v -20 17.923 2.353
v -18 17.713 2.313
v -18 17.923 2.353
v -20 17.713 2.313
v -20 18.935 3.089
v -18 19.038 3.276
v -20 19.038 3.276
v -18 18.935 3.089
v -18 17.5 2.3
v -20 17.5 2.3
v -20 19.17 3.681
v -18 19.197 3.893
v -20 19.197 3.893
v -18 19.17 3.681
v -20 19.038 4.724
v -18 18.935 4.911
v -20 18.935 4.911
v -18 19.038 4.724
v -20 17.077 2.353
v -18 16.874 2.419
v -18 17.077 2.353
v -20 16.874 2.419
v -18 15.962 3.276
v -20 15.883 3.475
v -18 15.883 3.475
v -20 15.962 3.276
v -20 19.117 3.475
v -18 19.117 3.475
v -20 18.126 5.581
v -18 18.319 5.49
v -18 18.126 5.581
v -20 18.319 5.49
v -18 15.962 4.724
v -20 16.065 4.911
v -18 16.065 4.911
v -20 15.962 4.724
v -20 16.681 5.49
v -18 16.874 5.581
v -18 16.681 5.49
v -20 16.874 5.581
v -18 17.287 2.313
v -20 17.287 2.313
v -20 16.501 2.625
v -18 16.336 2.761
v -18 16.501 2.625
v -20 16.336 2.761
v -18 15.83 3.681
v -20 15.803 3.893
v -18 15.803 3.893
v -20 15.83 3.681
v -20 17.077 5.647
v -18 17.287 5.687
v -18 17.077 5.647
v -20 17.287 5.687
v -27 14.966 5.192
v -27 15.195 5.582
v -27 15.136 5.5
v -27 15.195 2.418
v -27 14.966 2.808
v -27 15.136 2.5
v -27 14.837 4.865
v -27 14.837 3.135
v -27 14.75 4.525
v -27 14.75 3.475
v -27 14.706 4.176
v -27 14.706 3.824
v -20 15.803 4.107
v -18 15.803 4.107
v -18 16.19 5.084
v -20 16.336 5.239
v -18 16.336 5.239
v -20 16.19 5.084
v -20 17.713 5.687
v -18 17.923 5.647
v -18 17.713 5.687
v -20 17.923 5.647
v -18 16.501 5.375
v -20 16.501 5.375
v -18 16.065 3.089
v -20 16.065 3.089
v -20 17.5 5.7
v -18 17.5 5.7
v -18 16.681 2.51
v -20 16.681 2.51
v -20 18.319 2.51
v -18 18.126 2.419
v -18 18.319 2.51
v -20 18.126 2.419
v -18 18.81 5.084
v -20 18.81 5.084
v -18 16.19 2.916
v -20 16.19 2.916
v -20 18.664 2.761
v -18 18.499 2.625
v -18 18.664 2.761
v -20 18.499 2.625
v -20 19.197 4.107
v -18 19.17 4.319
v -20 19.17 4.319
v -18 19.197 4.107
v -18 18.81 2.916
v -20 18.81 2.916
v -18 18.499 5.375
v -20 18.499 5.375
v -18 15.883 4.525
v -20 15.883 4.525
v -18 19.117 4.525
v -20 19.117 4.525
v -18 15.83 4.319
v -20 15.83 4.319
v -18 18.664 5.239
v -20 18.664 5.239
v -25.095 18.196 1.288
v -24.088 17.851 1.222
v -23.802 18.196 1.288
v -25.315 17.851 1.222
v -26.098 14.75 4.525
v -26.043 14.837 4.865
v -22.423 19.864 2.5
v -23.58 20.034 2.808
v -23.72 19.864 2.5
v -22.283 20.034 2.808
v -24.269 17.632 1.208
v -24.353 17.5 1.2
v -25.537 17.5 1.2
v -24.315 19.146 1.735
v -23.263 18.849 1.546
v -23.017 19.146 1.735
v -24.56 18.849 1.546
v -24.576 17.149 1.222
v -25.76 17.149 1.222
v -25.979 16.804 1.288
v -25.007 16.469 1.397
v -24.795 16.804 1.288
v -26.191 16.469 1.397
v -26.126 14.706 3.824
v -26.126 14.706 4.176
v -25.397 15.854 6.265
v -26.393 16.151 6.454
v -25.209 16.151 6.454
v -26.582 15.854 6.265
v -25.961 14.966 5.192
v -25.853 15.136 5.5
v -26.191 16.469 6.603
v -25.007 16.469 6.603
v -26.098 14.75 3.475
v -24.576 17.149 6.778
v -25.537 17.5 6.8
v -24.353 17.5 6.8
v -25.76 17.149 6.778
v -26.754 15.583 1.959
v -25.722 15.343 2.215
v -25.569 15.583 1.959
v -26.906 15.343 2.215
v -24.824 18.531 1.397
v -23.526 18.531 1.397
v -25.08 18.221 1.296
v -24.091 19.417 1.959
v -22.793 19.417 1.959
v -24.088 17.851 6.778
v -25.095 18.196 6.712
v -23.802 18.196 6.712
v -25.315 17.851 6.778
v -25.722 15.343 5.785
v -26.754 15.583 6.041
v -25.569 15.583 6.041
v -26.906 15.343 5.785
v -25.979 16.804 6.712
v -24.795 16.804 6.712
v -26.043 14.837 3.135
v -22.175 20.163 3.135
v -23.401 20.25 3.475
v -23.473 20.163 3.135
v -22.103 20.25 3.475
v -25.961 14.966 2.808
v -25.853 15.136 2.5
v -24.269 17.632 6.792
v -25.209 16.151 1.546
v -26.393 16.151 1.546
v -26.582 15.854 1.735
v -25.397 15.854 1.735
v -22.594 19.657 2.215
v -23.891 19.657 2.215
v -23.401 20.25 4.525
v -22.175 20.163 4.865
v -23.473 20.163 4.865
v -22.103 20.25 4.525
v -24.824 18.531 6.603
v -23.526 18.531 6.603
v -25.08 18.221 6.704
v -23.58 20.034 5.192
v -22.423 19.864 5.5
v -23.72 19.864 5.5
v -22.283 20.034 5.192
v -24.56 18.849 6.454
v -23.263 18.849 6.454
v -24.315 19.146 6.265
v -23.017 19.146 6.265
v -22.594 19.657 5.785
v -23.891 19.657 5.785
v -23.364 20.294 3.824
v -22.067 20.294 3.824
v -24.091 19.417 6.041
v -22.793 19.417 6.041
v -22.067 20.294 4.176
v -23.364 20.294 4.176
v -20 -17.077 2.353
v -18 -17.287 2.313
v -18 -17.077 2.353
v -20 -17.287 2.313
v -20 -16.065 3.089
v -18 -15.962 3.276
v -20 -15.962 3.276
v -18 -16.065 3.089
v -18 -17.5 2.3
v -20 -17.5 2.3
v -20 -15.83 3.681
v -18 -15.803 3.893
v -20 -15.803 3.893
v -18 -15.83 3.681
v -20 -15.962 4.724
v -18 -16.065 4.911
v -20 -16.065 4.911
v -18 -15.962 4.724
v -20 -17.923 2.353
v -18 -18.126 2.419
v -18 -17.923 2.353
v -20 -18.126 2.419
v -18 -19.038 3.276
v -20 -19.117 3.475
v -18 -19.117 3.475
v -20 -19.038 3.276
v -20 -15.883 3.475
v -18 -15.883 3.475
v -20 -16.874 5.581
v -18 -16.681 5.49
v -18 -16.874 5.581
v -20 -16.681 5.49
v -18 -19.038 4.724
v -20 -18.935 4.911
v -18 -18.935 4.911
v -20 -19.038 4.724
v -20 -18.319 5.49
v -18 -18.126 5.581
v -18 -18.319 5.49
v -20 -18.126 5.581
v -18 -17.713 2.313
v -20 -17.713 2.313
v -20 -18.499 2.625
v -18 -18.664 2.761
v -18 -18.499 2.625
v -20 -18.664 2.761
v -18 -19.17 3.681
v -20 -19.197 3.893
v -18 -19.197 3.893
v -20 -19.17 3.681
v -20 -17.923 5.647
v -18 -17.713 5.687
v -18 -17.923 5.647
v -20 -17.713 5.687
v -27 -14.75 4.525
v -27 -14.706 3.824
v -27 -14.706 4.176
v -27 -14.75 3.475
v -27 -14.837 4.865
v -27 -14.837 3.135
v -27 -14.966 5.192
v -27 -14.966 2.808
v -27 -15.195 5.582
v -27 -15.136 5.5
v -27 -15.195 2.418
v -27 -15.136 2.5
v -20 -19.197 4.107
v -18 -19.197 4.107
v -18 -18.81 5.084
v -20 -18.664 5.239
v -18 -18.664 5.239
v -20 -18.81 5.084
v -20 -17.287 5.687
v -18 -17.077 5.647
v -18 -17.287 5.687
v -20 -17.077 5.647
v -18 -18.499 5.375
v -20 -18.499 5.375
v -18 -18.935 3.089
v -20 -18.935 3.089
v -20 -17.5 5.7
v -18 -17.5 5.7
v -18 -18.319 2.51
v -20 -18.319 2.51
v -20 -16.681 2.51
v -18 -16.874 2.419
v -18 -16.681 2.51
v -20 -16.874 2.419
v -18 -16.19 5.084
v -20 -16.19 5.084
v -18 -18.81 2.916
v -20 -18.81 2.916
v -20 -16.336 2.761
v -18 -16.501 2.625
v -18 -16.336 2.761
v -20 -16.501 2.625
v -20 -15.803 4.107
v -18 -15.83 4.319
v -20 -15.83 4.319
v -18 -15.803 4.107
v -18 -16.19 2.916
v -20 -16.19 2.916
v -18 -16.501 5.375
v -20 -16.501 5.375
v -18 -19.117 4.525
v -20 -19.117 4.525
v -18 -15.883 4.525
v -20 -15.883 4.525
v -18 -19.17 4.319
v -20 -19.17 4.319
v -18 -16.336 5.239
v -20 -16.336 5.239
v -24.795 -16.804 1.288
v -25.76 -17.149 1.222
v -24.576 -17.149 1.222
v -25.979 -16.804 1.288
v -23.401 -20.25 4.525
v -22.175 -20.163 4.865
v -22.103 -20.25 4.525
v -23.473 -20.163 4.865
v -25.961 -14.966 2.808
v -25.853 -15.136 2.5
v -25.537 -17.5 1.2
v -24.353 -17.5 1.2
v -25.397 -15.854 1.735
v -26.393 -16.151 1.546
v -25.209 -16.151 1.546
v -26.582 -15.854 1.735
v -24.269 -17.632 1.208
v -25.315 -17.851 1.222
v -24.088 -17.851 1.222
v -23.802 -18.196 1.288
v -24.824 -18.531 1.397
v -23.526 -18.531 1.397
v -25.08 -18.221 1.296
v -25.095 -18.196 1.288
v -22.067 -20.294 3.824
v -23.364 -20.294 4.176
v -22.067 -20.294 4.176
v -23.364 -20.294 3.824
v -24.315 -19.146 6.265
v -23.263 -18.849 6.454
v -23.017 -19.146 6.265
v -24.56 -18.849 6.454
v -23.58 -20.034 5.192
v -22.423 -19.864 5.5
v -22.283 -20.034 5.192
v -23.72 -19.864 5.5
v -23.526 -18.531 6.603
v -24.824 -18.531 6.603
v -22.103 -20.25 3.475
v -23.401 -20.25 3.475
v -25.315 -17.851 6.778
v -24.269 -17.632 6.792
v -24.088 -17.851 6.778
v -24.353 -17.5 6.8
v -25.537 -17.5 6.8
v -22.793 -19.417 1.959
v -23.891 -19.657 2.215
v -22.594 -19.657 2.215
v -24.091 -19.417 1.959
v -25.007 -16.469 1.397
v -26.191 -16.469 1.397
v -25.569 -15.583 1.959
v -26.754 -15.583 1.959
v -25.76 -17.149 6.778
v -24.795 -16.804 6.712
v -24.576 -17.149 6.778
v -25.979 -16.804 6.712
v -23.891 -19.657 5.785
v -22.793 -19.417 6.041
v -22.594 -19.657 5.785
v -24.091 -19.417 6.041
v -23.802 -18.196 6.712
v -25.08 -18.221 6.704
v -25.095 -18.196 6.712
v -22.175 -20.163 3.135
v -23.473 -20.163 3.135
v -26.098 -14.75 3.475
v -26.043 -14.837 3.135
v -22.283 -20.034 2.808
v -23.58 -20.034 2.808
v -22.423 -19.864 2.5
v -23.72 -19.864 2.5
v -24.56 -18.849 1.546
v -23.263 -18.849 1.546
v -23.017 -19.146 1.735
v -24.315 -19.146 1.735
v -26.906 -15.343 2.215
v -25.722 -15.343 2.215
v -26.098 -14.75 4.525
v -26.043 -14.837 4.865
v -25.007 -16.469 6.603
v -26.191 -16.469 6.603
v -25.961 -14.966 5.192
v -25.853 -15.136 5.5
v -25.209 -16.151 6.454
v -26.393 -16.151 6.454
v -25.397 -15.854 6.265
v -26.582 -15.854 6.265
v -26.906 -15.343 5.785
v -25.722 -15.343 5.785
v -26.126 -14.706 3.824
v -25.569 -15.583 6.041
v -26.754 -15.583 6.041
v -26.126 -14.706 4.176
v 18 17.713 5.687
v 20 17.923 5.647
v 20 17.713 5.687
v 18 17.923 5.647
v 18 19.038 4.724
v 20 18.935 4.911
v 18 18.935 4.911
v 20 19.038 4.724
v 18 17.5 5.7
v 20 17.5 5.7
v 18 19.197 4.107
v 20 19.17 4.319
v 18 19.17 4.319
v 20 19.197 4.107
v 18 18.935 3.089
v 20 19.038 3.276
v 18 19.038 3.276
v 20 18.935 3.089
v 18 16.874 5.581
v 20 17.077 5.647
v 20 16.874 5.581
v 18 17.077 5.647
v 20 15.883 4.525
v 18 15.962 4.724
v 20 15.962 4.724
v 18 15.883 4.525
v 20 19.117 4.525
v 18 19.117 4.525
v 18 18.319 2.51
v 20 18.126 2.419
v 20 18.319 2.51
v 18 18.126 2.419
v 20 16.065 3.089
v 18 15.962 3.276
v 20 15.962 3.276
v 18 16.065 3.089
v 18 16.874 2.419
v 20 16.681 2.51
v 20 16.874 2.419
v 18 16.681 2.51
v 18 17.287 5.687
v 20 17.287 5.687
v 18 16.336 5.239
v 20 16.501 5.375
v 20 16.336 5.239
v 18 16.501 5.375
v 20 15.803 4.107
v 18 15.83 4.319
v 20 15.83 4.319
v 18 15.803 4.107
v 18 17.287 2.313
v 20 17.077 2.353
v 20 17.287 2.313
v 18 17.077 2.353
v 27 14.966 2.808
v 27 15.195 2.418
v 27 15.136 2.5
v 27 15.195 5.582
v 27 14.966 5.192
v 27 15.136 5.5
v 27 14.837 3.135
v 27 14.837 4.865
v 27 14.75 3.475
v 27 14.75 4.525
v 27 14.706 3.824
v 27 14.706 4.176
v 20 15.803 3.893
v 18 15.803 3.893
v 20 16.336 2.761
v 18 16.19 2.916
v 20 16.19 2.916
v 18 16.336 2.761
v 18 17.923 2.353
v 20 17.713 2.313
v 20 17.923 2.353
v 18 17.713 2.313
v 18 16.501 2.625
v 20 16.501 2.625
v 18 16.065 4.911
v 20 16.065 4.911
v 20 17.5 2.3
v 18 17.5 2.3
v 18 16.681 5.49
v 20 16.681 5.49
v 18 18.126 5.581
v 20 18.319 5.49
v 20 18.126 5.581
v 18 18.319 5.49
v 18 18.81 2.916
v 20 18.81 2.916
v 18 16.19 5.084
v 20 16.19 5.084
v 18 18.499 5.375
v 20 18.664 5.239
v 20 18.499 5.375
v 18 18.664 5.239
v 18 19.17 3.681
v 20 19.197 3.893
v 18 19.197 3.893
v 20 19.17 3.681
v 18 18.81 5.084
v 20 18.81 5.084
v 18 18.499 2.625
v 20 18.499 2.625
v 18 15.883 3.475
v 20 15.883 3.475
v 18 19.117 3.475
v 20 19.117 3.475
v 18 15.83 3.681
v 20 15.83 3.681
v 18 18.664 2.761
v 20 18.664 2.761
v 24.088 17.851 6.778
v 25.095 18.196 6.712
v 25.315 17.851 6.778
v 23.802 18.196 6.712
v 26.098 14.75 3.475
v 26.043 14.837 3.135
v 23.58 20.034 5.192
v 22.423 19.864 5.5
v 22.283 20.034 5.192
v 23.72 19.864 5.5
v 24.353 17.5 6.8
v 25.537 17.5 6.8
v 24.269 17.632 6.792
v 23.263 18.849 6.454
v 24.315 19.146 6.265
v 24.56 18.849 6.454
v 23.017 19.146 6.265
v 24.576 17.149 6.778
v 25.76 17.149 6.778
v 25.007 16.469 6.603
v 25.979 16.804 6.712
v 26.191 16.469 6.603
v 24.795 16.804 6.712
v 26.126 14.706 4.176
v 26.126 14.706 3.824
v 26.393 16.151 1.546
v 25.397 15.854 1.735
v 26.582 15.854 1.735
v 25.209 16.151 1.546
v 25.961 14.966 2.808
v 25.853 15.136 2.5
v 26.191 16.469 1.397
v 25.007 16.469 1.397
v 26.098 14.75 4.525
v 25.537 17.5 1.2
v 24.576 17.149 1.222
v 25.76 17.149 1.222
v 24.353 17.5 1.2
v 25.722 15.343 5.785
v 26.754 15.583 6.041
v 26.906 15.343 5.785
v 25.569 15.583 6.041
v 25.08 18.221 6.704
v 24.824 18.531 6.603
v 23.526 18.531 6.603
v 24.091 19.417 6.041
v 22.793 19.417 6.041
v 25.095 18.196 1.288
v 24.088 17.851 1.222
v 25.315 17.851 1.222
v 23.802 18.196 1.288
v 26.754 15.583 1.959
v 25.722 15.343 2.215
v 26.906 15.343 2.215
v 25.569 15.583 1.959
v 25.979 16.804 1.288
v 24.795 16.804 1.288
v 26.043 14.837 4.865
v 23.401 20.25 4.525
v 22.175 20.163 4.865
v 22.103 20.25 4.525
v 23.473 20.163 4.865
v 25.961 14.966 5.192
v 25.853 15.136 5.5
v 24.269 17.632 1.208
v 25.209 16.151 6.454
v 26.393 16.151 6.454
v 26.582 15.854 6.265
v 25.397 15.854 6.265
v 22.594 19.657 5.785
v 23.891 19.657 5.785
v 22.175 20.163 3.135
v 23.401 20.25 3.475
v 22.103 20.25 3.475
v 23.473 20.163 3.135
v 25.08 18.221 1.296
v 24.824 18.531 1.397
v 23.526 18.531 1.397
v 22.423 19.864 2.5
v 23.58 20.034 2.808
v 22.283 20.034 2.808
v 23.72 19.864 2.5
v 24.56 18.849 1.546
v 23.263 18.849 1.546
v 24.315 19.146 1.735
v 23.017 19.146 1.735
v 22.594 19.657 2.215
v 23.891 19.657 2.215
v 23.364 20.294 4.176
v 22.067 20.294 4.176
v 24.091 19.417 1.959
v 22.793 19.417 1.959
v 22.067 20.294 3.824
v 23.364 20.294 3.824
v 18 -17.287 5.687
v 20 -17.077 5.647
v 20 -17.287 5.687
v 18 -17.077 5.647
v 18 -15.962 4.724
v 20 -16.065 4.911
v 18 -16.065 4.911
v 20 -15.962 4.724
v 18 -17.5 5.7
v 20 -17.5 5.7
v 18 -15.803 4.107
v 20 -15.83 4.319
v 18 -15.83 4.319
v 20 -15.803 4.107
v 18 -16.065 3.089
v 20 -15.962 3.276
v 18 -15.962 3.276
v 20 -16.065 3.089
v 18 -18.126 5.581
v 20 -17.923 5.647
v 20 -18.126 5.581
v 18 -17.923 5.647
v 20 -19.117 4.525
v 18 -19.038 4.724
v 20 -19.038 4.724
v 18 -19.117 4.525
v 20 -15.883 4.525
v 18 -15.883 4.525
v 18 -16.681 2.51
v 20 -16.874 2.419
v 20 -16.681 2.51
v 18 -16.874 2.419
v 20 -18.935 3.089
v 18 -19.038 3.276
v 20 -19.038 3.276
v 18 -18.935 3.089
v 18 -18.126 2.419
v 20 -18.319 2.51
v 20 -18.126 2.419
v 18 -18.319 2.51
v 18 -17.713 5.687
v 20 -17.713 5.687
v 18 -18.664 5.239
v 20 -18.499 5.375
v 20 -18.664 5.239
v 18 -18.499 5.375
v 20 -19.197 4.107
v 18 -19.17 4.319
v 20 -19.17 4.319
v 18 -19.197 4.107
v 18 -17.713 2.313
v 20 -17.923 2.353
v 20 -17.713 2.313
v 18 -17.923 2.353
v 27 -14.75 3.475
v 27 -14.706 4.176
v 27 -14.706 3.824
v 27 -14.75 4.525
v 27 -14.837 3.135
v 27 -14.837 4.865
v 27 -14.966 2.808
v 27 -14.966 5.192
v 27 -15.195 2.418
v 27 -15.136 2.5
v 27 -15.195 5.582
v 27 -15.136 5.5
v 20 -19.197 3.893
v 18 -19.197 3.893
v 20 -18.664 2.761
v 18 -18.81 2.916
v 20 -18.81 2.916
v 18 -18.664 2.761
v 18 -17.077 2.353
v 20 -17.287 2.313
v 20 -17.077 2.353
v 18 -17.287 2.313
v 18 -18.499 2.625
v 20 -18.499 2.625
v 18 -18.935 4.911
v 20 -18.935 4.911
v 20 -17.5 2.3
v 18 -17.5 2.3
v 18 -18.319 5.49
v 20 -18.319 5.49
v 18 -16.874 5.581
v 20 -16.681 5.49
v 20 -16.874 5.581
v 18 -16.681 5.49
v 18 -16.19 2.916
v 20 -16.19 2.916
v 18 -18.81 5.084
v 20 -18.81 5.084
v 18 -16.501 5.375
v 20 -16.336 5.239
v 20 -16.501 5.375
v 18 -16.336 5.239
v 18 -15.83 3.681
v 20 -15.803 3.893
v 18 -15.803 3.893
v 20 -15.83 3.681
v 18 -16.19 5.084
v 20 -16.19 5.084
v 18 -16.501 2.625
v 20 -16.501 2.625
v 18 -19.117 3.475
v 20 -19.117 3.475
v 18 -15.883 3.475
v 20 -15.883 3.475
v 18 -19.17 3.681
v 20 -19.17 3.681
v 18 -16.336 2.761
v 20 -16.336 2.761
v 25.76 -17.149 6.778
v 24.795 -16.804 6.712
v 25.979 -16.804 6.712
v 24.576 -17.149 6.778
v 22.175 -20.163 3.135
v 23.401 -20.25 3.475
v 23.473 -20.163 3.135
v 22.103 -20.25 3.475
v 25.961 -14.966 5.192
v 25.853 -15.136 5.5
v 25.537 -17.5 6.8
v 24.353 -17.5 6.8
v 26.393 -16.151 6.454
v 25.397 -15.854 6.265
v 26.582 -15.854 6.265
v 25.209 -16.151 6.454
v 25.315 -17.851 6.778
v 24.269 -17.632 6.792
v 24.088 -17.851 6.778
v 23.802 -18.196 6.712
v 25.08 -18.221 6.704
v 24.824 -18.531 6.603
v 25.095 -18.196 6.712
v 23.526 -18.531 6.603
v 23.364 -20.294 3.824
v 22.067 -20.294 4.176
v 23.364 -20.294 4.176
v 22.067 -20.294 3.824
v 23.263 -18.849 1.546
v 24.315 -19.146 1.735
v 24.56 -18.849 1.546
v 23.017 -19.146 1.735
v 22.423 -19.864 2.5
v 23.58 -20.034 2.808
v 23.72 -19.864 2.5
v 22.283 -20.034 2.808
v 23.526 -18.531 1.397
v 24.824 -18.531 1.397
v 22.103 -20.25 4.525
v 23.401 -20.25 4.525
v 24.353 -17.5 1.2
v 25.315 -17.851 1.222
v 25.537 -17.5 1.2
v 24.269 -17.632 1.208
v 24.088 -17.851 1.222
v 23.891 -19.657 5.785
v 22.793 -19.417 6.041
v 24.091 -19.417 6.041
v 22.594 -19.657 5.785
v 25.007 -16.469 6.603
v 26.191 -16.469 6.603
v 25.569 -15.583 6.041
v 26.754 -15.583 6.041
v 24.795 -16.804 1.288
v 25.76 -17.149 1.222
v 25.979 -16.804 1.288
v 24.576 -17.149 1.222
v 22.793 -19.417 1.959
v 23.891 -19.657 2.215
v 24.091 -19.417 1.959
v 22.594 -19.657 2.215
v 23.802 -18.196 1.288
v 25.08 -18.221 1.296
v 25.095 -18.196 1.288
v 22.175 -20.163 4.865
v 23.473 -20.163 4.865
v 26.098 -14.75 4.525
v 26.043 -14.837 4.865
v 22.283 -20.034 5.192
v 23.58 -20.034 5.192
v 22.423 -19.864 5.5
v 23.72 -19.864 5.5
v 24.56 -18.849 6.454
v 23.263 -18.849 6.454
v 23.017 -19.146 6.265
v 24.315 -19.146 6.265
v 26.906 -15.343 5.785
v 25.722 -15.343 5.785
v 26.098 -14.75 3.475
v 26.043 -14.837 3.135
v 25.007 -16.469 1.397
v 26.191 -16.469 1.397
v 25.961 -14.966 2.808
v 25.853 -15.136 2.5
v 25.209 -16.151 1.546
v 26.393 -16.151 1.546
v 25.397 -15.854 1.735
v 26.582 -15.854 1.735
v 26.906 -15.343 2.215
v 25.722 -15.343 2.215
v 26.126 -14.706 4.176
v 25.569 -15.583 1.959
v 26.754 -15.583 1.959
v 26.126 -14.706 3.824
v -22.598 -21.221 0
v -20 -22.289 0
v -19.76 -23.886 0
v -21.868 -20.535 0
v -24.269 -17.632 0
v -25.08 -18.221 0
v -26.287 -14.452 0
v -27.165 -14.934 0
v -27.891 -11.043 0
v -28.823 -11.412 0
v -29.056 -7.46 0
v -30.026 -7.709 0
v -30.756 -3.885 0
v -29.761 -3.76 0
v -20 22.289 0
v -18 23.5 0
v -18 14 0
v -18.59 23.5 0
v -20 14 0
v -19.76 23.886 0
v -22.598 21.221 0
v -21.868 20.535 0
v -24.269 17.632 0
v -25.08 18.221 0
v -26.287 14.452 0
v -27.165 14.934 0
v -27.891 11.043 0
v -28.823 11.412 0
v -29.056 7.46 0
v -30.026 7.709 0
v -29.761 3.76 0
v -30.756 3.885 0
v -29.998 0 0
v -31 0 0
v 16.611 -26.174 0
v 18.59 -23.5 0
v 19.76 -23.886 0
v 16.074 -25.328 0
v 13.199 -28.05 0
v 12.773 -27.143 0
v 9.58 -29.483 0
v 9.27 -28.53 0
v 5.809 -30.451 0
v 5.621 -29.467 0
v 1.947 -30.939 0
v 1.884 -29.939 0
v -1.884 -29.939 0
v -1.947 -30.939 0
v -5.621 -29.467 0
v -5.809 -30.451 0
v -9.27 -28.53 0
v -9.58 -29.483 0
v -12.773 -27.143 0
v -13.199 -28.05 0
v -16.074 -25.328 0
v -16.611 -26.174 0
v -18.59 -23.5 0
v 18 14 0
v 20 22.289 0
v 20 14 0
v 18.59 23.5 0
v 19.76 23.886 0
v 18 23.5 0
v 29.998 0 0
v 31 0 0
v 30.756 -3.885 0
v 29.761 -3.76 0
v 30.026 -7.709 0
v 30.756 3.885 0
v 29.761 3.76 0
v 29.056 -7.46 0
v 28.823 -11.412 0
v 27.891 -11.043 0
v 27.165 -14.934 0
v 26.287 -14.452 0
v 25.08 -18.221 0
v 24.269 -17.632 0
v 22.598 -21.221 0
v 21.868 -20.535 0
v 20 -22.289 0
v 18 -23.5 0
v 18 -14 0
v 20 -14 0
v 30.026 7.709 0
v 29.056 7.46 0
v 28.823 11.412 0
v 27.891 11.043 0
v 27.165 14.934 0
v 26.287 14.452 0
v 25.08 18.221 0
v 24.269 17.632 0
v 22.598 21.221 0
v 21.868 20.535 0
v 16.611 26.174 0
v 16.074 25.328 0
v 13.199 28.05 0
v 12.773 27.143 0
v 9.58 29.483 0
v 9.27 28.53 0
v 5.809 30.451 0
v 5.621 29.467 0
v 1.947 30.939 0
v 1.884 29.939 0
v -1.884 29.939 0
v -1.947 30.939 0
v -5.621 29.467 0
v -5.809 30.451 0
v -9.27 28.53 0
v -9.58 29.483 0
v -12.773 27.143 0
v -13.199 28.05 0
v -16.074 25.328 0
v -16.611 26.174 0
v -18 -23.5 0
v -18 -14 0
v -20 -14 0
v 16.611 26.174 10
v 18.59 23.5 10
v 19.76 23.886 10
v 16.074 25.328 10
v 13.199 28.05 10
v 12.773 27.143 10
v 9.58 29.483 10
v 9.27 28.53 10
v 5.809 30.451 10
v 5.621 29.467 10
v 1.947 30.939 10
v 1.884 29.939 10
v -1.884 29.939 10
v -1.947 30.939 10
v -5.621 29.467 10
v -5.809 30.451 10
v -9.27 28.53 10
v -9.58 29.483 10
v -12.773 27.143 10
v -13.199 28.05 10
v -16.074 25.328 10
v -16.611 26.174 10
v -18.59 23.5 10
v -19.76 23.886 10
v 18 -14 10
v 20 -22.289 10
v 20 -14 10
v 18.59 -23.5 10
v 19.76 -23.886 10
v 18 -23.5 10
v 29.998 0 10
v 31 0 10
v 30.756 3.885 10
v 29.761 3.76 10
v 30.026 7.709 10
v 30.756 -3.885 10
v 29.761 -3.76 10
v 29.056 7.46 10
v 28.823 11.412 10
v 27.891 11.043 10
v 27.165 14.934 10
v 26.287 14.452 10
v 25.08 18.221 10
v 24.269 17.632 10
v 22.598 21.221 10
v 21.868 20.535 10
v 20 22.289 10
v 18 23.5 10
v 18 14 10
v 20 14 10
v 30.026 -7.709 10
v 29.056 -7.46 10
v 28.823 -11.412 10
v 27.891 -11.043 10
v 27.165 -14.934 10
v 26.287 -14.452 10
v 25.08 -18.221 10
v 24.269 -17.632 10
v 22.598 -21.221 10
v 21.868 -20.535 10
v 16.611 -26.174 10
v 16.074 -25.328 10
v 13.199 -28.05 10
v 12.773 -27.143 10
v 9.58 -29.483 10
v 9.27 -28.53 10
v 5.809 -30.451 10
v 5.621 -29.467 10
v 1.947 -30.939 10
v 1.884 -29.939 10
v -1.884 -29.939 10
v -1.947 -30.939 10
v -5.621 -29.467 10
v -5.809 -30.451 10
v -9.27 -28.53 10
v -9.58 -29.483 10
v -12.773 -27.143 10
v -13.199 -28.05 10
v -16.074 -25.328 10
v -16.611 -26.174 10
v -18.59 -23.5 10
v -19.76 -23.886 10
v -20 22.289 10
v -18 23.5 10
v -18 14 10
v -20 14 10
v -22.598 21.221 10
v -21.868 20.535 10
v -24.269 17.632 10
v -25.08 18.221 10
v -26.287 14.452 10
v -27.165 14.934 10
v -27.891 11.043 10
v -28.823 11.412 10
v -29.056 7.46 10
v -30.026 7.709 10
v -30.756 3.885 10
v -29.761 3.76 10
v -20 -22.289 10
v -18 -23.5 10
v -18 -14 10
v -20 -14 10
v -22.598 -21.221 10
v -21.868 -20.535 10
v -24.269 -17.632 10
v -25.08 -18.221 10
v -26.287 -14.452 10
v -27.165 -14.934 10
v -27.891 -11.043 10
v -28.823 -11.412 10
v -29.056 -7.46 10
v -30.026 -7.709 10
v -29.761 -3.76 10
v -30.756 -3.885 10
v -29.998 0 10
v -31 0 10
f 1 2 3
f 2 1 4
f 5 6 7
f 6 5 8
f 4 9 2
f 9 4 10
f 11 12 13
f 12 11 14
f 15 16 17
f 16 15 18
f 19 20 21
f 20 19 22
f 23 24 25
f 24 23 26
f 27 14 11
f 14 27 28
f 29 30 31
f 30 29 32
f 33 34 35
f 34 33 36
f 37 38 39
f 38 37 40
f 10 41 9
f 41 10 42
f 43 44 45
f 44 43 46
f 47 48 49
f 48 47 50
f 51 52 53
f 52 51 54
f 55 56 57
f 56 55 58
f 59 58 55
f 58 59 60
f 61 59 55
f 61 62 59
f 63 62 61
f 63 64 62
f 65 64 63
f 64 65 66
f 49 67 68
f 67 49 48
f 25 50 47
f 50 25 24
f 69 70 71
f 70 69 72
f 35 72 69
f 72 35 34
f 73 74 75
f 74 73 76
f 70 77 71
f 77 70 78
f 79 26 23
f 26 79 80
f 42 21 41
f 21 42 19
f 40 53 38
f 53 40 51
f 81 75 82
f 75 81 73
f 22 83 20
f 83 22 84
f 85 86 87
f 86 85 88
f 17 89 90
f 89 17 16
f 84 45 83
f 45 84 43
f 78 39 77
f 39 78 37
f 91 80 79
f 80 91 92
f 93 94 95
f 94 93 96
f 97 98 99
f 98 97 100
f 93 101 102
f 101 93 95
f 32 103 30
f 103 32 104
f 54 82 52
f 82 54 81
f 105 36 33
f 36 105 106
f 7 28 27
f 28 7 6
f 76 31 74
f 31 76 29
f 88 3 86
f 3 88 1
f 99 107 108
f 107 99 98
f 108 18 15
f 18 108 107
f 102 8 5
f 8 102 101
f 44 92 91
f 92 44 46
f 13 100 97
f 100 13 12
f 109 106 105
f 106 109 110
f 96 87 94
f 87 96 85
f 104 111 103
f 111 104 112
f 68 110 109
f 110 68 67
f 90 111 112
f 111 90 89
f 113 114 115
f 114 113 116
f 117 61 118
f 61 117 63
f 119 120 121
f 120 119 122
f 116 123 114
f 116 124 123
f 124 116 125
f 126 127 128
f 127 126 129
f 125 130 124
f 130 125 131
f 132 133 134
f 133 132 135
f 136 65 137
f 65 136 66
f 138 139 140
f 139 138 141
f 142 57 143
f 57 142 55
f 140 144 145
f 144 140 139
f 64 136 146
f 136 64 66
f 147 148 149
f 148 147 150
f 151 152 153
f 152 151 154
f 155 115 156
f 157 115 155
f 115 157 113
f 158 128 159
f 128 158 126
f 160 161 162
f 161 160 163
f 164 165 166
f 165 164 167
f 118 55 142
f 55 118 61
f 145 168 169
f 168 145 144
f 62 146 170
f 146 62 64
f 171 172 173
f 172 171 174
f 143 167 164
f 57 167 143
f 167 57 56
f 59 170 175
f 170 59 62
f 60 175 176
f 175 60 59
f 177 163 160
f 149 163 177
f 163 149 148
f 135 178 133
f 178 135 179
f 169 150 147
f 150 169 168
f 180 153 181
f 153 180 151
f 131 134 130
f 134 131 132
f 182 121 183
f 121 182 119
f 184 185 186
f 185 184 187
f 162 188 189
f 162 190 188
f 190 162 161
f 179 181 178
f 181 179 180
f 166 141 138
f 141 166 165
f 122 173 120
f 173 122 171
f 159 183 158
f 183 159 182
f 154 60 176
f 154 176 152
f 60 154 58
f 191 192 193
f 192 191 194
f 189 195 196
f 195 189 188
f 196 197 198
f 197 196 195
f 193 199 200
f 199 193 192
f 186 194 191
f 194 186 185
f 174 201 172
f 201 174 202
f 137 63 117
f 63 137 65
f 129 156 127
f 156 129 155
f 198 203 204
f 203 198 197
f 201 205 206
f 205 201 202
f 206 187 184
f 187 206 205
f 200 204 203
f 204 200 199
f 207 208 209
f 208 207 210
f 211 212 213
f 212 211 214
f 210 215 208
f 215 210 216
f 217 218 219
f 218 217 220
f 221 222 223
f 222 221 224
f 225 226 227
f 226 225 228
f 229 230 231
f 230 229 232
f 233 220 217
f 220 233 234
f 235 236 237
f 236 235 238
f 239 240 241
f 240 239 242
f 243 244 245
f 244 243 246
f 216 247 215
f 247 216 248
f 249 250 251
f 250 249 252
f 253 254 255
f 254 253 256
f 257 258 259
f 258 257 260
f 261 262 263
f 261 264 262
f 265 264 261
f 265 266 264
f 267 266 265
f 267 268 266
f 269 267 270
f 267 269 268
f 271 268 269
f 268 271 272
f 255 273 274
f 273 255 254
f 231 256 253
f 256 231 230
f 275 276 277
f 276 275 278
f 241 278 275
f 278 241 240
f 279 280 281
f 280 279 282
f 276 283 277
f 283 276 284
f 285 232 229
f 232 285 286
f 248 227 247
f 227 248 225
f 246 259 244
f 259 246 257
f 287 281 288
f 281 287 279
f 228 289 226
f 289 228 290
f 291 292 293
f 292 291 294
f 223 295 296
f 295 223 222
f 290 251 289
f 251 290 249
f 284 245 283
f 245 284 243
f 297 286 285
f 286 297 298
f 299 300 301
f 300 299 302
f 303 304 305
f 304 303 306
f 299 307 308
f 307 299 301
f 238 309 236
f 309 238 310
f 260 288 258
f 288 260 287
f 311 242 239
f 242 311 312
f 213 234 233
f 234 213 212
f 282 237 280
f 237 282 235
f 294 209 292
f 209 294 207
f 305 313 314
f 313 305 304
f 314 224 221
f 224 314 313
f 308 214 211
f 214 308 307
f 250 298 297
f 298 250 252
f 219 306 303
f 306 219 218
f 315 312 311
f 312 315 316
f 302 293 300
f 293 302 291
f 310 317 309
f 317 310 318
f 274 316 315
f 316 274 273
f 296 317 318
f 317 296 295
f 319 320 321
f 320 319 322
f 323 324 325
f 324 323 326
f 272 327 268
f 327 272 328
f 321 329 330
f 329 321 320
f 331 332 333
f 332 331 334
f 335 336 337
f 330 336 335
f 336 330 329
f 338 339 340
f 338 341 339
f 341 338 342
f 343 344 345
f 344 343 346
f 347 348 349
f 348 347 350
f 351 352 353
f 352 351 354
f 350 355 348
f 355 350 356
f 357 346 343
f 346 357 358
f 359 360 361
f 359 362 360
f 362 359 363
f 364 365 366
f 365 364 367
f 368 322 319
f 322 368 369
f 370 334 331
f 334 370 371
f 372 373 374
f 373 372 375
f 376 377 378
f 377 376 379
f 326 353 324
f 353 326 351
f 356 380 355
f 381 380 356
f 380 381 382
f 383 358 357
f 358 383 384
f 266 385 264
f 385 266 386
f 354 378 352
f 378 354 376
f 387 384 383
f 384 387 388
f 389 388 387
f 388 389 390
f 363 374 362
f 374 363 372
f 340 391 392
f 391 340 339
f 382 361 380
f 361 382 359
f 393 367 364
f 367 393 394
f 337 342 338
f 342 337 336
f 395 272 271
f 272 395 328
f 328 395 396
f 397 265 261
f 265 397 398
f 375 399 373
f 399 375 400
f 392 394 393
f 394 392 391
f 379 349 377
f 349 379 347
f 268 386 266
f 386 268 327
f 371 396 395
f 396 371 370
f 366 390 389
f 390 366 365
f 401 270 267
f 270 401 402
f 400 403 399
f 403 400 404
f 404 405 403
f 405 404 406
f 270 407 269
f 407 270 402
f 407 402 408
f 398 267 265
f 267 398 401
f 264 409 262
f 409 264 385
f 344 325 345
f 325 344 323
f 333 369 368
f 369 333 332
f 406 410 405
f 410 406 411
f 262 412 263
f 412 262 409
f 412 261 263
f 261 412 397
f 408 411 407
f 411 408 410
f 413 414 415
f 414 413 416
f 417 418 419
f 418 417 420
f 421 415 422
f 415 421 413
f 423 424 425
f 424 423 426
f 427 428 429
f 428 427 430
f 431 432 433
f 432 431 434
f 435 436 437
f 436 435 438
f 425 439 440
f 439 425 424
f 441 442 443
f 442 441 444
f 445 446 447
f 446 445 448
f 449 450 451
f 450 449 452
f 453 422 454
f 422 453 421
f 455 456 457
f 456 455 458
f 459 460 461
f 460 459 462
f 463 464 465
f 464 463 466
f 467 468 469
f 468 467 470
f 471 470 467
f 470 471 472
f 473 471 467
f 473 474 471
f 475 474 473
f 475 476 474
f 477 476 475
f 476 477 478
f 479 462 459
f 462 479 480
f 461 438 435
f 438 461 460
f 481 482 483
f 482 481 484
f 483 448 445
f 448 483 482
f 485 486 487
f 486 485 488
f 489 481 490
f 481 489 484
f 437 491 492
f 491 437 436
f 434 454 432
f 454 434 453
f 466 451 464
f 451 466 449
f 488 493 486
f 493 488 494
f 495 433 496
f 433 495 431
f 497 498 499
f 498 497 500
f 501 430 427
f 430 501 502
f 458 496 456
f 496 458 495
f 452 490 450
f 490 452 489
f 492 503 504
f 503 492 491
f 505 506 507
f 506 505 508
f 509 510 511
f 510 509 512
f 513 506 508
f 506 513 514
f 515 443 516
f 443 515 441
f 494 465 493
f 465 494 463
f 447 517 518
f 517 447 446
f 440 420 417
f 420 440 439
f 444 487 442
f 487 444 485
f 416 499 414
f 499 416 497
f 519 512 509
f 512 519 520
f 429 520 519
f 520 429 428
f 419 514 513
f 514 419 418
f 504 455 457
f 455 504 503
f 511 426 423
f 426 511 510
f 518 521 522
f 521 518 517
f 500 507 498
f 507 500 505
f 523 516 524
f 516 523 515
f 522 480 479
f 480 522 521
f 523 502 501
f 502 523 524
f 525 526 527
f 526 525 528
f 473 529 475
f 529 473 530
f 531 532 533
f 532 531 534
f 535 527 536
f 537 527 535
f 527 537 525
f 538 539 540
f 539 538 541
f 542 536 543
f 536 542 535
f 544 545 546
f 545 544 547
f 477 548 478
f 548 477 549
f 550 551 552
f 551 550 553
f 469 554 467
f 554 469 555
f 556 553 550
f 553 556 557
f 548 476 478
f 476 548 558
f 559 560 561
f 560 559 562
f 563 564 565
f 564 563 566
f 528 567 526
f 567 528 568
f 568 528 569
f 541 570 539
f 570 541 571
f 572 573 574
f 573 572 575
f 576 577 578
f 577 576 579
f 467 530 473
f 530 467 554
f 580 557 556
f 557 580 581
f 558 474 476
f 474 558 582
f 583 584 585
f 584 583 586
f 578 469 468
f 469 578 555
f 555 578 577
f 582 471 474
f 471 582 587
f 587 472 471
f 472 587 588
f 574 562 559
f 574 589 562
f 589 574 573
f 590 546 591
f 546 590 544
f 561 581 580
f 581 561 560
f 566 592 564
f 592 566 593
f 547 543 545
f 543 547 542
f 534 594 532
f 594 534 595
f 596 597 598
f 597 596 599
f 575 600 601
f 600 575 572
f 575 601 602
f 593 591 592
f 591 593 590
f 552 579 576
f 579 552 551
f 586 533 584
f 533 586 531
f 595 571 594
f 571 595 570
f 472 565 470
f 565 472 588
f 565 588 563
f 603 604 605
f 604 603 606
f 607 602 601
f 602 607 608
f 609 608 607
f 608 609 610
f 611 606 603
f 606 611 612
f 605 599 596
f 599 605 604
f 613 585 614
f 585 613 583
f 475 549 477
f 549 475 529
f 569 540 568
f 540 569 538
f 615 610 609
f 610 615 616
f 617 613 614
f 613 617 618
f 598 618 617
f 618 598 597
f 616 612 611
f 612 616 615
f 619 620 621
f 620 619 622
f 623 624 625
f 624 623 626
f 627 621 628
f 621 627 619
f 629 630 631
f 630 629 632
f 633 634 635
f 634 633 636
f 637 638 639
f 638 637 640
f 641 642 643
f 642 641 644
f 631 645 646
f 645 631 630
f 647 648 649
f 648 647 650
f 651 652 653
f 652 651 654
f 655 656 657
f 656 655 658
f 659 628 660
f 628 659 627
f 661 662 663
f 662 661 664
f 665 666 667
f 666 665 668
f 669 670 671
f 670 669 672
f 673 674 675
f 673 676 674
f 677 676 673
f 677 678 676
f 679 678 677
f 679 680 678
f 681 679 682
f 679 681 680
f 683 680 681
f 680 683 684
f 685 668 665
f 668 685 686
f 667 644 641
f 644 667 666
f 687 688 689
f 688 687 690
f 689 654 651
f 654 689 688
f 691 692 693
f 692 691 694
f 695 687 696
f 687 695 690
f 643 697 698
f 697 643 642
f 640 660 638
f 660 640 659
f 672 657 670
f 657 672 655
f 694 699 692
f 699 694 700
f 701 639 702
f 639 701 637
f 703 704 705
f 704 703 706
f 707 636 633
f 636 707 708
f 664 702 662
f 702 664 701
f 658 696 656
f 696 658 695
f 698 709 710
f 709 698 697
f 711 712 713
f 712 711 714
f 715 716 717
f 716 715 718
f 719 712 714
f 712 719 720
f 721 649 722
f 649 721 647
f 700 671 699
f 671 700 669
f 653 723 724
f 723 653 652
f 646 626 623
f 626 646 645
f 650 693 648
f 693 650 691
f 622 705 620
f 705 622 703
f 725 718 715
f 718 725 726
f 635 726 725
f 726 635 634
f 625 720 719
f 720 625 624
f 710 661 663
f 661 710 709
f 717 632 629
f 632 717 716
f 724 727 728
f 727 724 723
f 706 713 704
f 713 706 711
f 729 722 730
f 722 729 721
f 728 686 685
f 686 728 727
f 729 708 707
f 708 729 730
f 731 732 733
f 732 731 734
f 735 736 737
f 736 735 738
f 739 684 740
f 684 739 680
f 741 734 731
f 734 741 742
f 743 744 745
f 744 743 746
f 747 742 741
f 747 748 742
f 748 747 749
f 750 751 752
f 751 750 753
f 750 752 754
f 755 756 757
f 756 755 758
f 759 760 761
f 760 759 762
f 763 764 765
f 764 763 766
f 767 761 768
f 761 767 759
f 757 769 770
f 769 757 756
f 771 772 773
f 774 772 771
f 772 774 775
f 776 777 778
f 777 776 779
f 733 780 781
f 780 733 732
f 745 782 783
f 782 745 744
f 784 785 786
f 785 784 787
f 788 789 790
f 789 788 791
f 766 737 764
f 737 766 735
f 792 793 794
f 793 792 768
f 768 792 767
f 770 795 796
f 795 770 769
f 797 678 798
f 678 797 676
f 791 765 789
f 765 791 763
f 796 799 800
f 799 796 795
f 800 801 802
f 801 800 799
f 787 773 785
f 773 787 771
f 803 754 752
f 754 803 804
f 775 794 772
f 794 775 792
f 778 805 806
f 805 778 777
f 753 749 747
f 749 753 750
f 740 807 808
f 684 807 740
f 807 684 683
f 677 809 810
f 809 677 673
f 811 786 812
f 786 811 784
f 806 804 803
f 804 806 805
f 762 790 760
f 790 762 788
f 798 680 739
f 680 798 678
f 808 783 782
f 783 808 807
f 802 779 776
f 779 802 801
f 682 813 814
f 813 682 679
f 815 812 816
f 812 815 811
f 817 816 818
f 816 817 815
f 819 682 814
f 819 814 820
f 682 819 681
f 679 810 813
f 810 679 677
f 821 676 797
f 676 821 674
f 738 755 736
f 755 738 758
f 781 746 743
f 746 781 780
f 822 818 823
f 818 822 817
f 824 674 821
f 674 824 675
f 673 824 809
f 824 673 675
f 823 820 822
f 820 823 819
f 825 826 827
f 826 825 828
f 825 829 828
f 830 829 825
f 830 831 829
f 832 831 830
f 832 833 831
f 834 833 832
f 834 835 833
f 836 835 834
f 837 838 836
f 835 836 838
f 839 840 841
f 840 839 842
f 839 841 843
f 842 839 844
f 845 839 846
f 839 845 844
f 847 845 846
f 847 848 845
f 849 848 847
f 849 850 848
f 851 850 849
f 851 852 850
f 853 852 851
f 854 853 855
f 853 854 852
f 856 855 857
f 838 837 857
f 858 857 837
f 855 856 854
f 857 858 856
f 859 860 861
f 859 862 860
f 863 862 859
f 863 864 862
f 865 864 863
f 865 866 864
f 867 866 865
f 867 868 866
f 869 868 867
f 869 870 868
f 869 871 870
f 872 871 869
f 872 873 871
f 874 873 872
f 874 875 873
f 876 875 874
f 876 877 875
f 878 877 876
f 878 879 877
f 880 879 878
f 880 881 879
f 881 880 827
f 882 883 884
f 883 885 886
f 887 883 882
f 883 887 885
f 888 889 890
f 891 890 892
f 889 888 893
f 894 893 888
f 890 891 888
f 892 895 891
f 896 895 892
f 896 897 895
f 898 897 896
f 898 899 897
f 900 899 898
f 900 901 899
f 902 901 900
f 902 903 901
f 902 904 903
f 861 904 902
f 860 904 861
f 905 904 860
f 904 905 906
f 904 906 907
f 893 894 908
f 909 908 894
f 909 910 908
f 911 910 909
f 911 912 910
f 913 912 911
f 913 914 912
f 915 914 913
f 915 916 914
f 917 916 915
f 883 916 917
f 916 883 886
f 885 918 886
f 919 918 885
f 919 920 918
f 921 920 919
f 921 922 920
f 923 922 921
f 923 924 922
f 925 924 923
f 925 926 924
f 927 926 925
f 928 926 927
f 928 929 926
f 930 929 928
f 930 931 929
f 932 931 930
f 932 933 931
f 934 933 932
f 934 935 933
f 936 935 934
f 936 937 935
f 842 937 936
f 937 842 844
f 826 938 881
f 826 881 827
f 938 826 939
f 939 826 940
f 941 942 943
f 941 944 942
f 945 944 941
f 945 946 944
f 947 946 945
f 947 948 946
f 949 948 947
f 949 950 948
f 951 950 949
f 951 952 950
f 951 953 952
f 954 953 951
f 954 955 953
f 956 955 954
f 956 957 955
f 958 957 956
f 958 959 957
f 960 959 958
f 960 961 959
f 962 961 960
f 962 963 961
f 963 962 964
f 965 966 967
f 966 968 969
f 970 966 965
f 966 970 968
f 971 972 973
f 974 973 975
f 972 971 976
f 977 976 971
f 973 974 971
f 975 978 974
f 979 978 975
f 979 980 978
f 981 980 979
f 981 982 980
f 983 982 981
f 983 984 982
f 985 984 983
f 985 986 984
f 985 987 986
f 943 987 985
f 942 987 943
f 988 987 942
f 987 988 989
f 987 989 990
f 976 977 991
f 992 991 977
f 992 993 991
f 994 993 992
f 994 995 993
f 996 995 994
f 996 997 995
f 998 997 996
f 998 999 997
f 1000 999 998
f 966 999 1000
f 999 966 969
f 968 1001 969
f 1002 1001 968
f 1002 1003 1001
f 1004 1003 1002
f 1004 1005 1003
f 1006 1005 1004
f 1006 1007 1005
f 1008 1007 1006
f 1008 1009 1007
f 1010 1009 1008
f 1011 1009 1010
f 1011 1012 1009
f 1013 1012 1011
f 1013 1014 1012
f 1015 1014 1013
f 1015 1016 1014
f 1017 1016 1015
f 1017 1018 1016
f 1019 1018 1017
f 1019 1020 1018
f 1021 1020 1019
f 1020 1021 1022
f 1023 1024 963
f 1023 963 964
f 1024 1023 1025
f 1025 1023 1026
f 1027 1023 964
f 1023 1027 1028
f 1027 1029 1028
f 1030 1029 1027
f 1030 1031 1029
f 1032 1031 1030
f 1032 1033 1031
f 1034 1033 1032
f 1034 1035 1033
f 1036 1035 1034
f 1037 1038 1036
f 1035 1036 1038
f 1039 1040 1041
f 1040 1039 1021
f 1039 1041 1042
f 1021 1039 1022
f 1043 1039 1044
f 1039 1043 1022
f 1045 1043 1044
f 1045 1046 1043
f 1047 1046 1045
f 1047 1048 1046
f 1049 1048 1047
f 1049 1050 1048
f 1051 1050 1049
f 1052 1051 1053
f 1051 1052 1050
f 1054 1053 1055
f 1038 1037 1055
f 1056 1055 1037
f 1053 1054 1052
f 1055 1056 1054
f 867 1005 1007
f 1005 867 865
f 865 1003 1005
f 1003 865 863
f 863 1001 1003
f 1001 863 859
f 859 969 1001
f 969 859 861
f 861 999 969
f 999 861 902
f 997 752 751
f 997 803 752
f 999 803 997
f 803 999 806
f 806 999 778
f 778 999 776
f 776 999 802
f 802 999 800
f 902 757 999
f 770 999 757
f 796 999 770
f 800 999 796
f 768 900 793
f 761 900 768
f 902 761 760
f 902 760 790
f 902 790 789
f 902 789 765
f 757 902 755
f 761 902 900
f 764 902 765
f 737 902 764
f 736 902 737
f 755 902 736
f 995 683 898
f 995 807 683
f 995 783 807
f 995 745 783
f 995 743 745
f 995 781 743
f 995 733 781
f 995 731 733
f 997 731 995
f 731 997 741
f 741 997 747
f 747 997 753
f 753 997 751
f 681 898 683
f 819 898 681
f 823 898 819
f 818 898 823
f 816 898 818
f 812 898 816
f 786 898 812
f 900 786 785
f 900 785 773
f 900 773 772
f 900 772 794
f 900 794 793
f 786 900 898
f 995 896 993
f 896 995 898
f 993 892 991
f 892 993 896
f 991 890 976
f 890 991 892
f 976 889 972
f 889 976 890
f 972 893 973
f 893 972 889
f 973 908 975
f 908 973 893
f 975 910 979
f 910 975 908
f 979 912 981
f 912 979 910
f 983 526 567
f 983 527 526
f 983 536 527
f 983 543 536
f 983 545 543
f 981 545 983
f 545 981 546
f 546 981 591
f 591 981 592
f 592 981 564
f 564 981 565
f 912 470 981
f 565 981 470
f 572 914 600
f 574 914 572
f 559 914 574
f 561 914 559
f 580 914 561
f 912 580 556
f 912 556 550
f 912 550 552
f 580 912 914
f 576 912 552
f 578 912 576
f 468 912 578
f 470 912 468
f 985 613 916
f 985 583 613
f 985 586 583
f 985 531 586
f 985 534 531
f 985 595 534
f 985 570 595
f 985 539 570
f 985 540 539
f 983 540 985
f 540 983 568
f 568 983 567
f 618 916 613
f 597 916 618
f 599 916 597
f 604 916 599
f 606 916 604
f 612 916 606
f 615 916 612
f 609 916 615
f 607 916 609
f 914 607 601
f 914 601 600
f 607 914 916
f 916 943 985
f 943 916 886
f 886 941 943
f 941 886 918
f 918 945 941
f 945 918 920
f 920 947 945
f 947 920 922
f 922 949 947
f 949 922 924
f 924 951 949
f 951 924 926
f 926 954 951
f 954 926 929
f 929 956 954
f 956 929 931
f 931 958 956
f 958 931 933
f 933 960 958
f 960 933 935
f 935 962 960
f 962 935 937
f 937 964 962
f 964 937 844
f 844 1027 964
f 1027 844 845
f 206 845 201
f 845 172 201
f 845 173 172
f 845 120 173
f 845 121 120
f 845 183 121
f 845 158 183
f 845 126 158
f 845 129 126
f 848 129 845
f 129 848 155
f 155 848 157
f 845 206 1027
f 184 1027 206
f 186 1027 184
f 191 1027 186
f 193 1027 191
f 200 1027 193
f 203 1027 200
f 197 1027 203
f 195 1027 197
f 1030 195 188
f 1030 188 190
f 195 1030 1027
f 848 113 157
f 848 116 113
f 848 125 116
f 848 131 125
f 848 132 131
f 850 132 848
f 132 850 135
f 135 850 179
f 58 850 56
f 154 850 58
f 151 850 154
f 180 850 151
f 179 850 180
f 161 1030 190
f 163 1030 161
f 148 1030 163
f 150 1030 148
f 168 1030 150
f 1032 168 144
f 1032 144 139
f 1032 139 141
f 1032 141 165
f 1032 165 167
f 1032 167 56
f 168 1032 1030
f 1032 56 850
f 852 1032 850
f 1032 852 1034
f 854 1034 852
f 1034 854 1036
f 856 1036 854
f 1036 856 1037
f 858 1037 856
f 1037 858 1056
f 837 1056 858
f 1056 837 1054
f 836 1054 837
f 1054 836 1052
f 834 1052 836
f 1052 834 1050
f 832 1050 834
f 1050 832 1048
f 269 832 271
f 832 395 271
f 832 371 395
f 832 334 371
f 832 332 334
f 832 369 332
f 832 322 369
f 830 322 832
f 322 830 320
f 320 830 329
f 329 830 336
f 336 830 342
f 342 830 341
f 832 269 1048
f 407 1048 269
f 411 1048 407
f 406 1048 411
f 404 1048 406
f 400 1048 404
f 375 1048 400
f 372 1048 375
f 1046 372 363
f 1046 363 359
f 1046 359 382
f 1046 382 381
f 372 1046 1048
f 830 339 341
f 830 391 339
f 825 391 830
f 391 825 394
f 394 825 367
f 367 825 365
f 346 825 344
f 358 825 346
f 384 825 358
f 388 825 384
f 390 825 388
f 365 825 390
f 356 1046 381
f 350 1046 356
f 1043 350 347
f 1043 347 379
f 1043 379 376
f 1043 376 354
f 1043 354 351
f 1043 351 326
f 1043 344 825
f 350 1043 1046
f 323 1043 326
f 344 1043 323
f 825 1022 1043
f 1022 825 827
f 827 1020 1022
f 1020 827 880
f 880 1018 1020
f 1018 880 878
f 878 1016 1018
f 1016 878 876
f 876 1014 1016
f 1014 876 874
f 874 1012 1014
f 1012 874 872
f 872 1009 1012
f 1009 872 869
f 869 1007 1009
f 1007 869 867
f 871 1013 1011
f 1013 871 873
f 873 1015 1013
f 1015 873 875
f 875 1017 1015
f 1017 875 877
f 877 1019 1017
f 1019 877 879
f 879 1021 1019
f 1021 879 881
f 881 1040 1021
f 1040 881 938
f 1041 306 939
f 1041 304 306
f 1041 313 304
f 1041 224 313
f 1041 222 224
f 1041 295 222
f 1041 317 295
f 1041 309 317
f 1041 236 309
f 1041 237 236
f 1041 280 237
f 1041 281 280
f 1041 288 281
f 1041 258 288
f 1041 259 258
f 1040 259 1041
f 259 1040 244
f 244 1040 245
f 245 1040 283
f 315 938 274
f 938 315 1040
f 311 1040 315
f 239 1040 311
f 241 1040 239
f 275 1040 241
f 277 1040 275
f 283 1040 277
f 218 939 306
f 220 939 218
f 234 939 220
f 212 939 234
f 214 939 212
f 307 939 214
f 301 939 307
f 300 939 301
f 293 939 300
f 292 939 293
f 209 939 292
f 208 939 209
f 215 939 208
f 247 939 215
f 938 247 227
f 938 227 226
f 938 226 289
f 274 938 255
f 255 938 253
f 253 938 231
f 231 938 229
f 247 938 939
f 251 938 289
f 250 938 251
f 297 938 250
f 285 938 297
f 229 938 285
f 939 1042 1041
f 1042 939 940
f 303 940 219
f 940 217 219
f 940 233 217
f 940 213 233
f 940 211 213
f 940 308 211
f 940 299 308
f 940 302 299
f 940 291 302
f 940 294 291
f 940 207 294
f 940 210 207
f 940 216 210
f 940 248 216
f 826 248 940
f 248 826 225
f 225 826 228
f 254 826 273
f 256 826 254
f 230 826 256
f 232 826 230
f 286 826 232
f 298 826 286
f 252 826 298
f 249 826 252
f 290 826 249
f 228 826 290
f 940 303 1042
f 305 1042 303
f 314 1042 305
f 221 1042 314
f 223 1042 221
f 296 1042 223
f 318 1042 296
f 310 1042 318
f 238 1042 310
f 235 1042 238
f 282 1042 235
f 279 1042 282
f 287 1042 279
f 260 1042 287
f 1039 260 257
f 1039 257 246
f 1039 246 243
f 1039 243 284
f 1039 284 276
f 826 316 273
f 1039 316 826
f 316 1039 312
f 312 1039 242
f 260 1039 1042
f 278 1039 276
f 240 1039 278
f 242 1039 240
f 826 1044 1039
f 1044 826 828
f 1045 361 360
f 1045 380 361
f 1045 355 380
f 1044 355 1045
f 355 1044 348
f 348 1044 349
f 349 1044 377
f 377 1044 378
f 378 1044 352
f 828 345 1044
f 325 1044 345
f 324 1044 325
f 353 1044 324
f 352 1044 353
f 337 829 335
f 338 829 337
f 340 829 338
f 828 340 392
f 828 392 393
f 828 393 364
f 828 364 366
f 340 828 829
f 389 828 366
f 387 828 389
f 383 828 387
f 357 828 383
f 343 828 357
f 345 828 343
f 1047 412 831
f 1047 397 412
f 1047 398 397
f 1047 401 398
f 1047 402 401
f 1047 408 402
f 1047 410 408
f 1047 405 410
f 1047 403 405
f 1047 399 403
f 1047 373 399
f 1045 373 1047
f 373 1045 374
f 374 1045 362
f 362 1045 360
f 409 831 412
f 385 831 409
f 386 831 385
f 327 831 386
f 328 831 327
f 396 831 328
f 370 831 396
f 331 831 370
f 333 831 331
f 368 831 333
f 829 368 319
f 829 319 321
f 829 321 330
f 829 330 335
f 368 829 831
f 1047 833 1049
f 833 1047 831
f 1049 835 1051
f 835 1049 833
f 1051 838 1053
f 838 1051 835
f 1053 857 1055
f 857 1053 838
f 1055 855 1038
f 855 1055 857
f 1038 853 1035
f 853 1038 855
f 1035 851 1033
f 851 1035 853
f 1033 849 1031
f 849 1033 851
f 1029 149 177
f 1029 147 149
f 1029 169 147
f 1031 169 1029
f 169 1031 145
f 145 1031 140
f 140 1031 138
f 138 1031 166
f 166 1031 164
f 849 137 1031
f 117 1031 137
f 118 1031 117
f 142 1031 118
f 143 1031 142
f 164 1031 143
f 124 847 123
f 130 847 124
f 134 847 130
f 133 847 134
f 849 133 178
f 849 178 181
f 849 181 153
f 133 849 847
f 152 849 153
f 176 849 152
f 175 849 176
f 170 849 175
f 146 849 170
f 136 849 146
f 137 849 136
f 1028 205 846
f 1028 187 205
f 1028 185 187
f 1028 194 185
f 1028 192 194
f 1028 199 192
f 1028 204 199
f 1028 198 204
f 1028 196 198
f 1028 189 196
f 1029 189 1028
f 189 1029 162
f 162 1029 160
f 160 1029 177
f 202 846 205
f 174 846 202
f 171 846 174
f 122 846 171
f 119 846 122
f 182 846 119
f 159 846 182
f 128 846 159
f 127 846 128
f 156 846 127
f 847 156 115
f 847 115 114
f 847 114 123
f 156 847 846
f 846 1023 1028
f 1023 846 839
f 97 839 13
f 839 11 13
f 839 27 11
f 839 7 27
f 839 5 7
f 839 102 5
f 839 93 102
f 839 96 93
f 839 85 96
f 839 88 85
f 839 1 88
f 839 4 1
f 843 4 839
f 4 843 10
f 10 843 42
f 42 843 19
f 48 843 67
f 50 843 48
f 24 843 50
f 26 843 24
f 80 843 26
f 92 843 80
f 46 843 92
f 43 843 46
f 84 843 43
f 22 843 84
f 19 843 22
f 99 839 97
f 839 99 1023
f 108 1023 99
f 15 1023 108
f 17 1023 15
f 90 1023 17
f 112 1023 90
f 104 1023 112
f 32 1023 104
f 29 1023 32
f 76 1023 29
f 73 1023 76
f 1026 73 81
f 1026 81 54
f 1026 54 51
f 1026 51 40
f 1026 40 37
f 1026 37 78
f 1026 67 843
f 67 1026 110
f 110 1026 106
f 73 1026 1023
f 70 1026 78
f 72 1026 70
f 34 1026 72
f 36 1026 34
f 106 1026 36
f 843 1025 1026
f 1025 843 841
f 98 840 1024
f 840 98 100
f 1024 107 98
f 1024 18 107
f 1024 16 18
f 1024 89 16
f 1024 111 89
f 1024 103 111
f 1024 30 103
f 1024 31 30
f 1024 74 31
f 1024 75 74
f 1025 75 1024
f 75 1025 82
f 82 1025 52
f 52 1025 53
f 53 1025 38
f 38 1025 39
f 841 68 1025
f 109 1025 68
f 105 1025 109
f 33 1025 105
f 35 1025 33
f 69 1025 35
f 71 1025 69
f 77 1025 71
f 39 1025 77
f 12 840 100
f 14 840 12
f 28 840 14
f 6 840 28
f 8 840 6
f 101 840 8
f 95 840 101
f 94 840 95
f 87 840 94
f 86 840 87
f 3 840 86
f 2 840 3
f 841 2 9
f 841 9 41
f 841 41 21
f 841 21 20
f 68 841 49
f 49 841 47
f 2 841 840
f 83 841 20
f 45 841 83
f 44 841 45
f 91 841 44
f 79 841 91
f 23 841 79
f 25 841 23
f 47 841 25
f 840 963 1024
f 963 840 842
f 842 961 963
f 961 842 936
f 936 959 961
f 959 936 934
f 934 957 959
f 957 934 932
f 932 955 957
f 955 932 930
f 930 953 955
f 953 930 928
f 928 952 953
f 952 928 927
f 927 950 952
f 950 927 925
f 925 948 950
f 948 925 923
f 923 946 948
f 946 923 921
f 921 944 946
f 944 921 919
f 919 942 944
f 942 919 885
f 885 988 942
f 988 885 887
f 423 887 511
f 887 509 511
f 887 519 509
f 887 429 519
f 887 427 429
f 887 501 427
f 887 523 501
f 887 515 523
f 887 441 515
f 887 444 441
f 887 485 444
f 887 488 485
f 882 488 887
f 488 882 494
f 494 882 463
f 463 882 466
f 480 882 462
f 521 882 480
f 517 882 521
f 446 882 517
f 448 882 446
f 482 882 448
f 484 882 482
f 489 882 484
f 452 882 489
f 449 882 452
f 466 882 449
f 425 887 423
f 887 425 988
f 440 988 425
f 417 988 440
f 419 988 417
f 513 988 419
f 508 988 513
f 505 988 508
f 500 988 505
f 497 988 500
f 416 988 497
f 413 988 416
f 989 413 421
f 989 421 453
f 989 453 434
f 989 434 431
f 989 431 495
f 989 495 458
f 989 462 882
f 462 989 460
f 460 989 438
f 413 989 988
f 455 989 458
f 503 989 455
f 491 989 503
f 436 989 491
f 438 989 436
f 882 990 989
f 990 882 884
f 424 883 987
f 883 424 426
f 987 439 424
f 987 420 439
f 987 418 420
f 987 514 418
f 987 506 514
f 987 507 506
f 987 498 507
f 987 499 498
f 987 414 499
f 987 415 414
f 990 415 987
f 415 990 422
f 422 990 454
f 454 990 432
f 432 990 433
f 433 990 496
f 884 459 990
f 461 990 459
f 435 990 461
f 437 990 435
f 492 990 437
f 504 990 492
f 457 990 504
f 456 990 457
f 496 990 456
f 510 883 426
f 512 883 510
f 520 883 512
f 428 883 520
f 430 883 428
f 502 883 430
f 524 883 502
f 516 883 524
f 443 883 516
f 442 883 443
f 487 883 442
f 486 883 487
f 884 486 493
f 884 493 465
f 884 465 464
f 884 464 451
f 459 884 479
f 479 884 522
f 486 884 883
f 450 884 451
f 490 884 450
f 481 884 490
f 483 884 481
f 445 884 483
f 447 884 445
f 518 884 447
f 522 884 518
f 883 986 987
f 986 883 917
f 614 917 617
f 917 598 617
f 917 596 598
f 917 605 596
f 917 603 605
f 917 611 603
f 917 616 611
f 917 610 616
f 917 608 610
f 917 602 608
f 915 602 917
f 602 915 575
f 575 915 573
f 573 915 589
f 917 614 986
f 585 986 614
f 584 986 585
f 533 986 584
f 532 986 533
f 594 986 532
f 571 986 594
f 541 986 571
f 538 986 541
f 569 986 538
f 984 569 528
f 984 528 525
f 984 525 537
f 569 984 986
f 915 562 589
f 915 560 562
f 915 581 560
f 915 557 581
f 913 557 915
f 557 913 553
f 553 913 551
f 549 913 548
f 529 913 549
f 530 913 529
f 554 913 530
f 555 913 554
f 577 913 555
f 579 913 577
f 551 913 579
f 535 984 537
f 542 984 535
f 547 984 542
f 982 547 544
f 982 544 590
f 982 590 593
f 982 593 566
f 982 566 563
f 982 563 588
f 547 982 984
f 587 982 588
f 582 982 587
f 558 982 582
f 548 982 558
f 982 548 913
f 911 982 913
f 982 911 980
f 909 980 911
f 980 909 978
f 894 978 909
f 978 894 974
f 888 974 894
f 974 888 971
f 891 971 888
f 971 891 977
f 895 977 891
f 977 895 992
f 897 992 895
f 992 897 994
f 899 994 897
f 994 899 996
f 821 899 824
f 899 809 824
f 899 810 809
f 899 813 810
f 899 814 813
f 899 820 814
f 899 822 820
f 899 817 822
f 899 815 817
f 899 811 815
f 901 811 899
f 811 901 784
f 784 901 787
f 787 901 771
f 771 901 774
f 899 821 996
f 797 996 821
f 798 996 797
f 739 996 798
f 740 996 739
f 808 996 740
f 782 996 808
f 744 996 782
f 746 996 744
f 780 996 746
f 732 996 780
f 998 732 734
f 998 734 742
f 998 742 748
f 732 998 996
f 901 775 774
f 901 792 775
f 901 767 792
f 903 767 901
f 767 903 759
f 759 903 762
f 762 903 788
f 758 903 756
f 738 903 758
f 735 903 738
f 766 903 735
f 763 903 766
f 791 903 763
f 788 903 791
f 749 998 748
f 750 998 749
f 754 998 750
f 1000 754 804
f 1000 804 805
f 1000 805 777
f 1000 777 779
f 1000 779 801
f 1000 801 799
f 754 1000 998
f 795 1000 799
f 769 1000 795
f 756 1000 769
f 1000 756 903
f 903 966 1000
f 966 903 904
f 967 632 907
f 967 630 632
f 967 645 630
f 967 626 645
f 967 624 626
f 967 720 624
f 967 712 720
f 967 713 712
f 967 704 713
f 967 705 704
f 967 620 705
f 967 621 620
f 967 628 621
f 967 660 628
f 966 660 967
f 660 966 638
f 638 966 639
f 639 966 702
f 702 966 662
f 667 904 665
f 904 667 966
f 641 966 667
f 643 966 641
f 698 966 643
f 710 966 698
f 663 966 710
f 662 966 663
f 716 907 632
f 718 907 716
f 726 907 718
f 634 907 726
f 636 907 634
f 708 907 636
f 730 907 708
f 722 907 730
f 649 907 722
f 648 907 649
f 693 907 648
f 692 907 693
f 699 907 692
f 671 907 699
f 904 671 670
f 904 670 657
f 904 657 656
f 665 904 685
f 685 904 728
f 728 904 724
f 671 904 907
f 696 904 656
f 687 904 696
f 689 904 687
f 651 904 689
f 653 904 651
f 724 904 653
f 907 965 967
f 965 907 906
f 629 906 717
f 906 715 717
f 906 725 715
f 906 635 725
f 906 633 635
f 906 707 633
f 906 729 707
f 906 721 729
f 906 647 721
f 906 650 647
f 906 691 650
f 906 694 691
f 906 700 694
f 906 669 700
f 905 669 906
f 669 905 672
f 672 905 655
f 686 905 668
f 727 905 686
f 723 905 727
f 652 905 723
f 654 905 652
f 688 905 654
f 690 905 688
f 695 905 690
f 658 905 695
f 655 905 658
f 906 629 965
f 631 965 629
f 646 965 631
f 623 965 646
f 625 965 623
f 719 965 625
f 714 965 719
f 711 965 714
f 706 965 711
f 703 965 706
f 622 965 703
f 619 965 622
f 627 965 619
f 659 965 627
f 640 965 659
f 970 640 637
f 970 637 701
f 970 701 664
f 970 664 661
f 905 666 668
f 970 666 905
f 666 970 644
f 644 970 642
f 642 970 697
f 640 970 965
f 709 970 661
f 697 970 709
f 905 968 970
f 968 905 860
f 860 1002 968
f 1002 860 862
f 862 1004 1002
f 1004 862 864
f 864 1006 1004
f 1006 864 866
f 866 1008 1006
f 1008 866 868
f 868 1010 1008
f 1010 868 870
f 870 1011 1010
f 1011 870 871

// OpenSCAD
$fn=50;

module sketch() {
      circle(r=31);
}

module screw_m3() {
        union() {
            linear_extrude(12) {
                circle(r=1.7);
            }
            linear_extrude(6) {
                circle(r=2.8);
            }
        }
}

difference(){
    linear_extrude(10) {
        union() {
            difference(){
              offset(0) offset(0){
                  sketch();
              }
              offset(0) offset(-1) sketch();
            }

            translate([-18,-23.5,0]) rotate([0,0,90]) square([9.5,2]);
            translate([20,-23.5,0]) rotate([0,0,90]) square([9.5,2]);
            translate([-18,14,0]) rotate([0,0,90]) square([9.5,2]);
            translate([20,14,0]) rotate([0,0,90]) square([9.5,2]);
        }
    }

    union() {
        translate([-27,17.5,4]) {
            rotate([0,90,0]) {
                screw_m3();
            }
        }
        translate([-27,-17.5,4]) {
            rotate([0,90,0]) {
                screw_m3();
            }
        }
        translate([27,17.5,4]) {
            rotate([0,-90,0]) {
                screw_m3();
            }
        }
        translate([27,-17.5,4]) {
            rotate([0,-90,0]) {
                screw_m3();
            }
        }
    }
}
